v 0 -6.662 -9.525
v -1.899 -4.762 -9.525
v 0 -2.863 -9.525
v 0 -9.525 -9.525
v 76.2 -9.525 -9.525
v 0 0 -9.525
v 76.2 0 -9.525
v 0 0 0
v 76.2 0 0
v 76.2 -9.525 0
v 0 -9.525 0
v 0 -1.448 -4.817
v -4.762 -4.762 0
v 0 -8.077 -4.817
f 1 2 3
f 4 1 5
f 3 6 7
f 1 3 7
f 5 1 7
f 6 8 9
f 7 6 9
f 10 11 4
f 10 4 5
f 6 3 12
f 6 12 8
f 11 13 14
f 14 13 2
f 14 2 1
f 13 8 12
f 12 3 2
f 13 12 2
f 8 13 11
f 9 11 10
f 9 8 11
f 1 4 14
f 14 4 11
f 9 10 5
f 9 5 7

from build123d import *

# Parameters (mm, degrees)
F0_W     = 76.2
F0_H     = 9.525
F1_DEPTH = 9.525
F2_DEPTH = 9.525
F2_TAPER = 12


with BuildPart() as f1:
    # F0 (on Top) → F1 (new body)
    with BuildSketch(Plane.XY):
        with Locations((38.1, -4.7625)):
            Rectangle(F0_W, F0_H)
    extrude(amount=-F1_DEPTH)

    # F0 (on Top) → F2 (join)
    with BuildSketch(Plane.XY):
        with Locations((38.1, -4.7625)):
            Rectangle(F0_W, F0_H)
        Polygon((0, -9.525), (0, 0), (-4.7625, -4.7625), align=None)
    extrude(amount=-F2_DEPTH, taper=F2_TAPER)


solid = f1.part
